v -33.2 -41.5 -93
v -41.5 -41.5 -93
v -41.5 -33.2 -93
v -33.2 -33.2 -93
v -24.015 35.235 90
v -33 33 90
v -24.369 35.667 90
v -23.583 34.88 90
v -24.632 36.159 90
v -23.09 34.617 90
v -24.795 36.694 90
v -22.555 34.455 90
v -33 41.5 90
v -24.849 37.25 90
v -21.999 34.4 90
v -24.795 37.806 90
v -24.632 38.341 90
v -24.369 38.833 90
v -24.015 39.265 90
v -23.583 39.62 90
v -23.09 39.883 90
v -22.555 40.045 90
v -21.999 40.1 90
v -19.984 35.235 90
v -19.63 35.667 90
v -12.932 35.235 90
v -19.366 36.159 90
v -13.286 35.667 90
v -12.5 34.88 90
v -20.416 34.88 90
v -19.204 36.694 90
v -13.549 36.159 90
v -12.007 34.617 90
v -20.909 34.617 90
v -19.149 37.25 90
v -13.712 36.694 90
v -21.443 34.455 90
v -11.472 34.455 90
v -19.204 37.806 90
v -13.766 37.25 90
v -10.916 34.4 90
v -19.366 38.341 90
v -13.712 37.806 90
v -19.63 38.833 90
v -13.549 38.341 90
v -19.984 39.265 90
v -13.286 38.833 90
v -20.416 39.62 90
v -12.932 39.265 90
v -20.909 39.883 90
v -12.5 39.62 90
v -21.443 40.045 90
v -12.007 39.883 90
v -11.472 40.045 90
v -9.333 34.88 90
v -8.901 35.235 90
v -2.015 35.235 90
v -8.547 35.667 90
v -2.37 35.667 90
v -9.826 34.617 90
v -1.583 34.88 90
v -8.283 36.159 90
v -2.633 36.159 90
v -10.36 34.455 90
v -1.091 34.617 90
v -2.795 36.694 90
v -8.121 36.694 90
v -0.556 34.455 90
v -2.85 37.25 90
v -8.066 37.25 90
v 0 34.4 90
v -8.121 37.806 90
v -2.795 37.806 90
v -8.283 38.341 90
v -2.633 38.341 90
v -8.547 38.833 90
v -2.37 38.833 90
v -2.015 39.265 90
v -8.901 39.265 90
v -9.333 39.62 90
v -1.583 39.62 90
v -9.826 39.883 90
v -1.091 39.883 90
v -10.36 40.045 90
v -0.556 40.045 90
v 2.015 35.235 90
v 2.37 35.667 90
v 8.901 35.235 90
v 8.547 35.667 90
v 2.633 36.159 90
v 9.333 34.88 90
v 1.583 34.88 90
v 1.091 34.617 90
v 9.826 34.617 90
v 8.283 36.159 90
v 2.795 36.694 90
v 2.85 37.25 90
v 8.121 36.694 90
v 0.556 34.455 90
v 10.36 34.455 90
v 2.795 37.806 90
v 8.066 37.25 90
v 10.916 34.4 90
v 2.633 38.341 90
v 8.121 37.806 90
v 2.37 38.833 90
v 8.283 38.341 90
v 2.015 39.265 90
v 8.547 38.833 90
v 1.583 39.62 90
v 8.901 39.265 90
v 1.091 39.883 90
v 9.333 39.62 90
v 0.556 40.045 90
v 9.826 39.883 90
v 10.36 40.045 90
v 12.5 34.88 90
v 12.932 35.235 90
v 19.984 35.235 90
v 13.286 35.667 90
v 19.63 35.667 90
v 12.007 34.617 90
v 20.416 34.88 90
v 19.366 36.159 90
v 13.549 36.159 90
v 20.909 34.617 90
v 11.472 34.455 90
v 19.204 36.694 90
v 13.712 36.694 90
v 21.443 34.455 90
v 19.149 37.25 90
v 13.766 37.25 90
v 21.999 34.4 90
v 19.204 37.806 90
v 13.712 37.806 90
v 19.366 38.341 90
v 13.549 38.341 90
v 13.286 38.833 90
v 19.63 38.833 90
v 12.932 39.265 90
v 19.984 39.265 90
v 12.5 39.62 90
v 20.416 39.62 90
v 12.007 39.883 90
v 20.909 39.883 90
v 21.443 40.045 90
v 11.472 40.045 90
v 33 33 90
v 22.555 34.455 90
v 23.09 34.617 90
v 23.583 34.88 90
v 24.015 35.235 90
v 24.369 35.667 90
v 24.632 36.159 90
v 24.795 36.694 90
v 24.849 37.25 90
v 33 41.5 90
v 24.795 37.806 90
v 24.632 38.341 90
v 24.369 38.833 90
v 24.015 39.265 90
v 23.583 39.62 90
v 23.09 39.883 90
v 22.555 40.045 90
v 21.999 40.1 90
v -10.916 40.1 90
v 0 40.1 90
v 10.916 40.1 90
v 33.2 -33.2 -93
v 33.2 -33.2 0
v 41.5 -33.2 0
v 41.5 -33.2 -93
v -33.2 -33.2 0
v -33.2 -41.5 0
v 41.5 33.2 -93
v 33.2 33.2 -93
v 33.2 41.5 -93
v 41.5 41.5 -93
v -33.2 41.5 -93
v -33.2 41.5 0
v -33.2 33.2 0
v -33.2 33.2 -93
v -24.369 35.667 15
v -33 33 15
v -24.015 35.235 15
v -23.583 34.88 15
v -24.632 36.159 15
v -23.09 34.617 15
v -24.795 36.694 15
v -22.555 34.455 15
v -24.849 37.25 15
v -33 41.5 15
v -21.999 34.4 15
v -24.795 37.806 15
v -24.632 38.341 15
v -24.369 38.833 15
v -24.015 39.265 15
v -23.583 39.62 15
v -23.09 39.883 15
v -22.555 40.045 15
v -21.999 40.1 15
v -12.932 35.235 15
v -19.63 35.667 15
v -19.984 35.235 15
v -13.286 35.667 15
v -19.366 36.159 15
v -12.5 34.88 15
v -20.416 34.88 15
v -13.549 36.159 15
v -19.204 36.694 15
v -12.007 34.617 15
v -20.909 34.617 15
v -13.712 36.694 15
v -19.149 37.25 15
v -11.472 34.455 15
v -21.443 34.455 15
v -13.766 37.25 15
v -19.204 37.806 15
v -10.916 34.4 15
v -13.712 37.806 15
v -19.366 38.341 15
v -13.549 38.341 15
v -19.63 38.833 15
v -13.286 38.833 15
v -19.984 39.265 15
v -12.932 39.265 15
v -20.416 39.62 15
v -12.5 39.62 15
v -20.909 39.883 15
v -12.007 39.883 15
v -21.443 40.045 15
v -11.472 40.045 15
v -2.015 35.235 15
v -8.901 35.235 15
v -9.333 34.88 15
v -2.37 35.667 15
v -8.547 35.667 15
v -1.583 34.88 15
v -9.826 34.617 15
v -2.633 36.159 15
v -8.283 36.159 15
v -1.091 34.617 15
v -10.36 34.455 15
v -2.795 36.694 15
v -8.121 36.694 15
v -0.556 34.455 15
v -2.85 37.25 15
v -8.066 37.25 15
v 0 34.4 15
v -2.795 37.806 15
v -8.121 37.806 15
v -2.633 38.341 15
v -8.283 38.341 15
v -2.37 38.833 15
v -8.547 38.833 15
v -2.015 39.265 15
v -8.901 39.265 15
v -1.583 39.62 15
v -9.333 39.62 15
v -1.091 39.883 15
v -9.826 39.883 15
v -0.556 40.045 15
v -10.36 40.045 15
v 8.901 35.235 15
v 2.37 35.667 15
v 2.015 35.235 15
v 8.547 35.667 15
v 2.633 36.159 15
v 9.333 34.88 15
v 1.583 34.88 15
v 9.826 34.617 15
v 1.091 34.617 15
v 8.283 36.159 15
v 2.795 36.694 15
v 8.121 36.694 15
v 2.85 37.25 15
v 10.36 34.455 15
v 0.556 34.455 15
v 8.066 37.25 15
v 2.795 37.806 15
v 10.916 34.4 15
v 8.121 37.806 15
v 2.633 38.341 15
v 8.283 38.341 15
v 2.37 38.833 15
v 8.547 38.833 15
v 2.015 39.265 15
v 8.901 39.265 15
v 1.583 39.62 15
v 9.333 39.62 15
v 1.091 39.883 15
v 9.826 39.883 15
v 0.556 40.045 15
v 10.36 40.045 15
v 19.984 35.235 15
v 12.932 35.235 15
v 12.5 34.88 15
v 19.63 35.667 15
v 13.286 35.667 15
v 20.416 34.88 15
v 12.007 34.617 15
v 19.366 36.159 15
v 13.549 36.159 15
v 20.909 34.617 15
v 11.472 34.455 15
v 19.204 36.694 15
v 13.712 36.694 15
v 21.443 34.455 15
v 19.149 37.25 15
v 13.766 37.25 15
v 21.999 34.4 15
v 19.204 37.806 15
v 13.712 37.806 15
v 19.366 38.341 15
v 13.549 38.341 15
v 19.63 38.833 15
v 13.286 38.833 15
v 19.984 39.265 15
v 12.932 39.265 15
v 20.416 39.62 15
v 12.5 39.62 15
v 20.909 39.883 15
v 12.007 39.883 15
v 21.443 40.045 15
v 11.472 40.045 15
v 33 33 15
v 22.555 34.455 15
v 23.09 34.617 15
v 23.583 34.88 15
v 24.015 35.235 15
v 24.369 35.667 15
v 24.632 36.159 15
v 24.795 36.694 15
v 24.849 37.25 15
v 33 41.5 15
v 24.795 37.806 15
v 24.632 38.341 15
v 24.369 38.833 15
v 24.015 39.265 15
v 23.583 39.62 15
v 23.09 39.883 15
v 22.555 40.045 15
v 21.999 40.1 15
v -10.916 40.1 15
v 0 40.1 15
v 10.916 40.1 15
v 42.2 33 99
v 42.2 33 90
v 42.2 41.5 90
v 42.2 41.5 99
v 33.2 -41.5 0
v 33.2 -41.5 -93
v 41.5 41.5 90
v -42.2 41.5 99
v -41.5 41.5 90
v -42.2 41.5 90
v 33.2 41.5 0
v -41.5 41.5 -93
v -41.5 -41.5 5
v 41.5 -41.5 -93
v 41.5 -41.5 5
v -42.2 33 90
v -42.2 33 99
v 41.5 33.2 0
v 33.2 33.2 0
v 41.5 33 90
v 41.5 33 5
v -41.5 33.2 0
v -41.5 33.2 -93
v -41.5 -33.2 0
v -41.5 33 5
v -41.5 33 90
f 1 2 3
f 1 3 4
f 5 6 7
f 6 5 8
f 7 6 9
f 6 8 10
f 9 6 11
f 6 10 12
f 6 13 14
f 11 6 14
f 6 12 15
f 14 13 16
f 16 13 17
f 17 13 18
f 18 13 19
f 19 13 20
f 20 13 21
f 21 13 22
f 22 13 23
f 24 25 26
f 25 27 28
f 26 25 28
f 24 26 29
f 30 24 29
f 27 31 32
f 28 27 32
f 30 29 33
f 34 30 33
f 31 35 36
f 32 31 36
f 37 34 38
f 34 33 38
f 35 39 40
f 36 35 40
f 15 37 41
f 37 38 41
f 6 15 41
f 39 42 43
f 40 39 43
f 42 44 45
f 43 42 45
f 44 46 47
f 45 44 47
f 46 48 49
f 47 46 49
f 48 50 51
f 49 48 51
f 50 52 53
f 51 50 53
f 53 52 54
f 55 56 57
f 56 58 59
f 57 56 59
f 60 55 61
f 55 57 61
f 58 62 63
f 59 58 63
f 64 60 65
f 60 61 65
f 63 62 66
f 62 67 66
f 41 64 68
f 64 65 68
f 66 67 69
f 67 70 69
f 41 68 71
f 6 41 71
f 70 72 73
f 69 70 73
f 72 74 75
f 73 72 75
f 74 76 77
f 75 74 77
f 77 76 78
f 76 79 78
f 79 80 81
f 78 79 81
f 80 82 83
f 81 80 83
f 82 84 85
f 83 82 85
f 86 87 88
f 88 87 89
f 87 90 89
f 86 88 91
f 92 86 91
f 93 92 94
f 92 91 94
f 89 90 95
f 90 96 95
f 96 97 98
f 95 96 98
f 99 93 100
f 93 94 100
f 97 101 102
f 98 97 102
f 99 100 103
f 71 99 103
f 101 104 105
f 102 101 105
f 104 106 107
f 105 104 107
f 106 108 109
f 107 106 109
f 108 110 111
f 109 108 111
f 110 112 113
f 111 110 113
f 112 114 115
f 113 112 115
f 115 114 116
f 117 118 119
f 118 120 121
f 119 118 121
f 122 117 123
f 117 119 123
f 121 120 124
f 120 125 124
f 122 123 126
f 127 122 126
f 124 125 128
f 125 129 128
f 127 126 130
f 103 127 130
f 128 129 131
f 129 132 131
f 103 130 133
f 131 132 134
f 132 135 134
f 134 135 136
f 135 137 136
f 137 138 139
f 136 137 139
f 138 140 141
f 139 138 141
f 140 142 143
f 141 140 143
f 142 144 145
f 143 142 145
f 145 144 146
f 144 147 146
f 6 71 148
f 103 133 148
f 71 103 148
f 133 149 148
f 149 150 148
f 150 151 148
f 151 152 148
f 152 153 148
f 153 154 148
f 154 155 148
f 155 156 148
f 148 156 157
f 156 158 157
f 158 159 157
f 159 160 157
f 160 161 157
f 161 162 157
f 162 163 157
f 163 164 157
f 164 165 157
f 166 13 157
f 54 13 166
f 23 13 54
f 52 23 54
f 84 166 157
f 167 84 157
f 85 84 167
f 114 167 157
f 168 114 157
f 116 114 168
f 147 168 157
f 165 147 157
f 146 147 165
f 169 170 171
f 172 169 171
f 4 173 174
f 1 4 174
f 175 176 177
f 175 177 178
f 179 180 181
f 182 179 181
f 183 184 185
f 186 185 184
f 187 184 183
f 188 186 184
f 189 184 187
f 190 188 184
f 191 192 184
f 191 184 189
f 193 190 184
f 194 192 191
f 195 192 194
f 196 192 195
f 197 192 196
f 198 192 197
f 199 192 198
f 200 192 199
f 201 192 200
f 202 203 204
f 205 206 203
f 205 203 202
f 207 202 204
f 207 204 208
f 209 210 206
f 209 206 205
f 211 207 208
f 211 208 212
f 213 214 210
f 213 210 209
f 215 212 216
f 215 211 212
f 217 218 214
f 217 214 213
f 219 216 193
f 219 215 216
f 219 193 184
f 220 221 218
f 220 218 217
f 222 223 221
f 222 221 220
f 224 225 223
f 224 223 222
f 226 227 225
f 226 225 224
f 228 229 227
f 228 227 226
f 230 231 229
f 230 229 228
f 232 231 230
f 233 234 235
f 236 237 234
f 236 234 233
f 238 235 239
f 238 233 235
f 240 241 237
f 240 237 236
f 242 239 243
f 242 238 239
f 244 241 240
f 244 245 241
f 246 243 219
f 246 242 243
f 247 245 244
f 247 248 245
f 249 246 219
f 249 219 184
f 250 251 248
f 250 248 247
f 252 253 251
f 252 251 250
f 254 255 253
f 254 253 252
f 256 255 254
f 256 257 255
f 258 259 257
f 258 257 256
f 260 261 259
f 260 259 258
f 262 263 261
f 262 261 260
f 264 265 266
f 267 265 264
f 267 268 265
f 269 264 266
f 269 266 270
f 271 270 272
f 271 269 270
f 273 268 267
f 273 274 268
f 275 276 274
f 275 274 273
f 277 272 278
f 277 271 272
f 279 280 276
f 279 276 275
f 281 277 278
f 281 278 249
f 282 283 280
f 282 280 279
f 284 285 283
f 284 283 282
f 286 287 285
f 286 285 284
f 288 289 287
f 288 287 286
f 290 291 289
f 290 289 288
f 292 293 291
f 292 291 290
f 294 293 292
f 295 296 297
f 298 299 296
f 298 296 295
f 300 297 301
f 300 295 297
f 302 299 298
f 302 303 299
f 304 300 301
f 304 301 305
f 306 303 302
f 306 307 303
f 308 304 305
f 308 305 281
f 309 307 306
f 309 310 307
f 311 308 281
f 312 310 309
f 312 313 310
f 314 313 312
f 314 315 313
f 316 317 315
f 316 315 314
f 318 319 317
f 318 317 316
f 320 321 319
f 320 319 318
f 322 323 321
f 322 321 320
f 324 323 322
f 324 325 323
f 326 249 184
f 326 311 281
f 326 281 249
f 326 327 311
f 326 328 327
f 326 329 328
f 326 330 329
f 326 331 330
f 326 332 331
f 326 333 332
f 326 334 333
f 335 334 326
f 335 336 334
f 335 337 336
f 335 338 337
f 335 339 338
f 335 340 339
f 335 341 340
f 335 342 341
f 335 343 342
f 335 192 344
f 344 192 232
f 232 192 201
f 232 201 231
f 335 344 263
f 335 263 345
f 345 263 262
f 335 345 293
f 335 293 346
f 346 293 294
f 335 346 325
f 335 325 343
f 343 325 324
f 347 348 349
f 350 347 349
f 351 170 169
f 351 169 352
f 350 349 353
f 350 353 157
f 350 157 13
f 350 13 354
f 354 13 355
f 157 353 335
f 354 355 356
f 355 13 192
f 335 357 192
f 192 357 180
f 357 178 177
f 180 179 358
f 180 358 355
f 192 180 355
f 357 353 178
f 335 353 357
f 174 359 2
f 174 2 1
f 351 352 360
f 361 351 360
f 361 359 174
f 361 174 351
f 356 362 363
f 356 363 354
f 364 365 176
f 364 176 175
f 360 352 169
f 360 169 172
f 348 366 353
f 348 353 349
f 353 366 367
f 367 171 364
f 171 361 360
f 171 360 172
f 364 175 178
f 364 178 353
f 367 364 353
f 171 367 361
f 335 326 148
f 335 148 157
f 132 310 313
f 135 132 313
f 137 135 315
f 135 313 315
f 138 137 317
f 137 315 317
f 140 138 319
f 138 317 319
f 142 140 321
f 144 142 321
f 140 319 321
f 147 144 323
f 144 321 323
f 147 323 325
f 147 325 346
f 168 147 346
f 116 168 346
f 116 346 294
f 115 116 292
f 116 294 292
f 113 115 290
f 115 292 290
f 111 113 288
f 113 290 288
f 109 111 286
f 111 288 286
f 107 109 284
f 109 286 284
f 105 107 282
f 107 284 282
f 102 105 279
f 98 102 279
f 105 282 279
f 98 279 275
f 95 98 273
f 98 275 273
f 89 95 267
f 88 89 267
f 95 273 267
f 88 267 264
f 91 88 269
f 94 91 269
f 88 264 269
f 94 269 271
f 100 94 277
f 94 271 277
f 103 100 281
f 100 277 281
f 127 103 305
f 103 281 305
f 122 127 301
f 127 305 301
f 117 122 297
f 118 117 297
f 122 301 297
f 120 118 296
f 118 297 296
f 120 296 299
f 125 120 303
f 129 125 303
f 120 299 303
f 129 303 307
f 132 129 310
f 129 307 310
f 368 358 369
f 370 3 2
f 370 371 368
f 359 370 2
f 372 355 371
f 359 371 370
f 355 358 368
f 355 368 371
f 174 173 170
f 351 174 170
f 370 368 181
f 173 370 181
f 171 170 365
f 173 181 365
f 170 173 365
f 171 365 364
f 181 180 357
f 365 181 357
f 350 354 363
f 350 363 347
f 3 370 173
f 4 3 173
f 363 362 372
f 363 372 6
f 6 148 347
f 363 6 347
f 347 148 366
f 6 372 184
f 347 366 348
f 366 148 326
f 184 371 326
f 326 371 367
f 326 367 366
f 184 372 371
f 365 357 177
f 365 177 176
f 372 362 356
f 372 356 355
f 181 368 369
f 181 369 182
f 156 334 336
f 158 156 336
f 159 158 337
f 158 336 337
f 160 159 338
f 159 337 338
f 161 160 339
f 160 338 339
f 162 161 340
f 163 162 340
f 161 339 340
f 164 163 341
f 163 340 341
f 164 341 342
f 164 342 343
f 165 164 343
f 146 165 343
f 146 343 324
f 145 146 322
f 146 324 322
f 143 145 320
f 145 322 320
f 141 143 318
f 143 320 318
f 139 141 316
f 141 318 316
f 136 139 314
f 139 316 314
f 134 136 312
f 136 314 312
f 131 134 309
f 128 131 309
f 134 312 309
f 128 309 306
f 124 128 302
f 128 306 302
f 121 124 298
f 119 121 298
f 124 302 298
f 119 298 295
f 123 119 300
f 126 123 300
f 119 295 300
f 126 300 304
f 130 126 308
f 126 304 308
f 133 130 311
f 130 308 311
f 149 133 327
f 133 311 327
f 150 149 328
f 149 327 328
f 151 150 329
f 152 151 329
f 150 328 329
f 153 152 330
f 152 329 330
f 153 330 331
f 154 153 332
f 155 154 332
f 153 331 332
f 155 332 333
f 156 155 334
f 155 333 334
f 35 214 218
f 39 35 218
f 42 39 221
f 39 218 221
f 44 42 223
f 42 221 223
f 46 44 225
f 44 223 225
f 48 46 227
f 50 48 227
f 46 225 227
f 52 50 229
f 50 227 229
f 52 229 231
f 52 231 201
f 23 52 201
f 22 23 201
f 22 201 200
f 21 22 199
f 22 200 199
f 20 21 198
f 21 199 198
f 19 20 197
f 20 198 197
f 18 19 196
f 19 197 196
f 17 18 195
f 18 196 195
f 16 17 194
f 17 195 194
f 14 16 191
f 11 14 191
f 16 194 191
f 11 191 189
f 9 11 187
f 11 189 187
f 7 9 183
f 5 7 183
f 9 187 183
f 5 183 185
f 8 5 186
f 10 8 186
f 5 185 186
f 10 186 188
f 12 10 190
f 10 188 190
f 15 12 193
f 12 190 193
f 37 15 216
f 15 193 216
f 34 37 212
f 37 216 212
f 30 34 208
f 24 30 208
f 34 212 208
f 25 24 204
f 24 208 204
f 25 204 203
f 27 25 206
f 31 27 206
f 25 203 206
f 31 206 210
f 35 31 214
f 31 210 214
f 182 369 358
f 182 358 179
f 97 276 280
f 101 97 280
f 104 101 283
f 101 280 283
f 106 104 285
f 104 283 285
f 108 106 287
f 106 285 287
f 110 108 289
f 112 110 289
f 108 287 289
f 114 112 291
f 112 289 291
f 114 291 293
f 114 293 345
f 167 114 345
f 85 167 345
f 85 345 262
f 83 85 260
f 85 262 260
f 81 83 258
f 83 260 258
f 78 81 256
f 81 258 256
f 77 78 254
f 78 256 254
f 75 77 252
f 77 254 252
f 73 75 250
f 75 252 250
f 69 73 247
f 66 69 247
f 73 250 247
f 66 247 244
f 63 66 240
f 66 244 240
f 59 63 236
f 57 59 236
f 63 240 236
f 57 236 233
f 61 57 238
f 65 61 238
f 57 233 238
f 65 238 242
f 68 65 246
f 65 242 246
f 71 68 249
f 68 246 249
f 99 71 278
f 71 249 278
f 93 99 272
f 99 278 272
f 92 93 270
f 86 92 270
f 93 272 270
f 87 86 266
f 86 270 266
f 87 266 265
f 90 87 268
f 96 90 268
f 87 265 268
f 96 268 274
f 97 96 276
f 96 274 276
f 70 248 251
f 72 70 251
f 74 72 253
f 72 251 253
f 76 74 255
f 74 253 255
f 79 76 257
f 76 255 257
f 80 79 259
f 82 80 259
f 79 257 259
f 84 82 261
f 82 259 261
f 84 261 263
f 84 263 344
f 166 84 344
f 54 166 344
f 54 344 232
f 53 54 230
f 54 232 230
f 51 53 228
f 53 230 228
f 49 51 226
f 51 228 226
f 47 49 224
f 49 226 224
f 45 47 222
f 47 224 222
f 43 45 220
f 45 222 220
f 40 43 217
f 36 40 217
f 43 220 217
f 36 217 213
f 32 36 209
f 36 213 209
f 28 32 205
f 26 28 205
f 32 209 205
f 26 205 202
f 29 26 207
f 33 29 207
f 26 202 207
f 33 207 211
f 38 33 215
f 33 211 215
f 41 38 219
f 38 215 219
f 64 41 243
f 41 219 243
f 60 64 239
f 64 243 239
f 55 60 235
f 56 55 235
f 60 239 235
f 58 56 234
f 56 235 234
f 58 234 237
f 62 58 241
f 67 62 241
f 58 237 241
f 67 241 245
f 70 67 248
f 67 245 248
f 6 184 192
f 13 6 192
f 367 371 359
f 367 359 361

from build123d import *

# Parameters (mm, degrees)
F0_W      = 83
F0_H      = 83
F1_DEPTH  = 5
F2_W      = 83
F2_H      = 8.5
F3_DEPTH  = 10
F4_W      = 8.5
F4_H      = 8.5
F5_DEPTH  = 75
F6_R      = 2.85
F7_DEPTH  = 75
F8_W      = 83
F8_H      = 8.5
F8_R      = 2.85
F8_W_2    = 0.7
F9_DEPTH  = 9
F10_W     = 8.3
F10_H     = 8.3
F11_DEPTH = 93


with BuildPart() as f1:
    # F0 (on Top) → F1 (new body)
    with BuildSketch(Plane.XY):
        Rectangle(F0_W, F0_H)
    extrude(amount=F1_DEPTH)

    # F2 (on face) → F3 (join)
    with BuildSketch(Plane.XY.offset(5)):
        with Locations((0, 37.25)):
            Rectangle(F2_W, F2_H)
    extrude(amount=F3_DEPTH)

    # F4 (on face) → F5 (join)
    with BuildSketch(Plane.XY.offset(15)):
        with Locations((-37.25, 37.25)):
            Rectangle(F4_W, F4_H)
        with Locations((37.25, 37.25)):
            Rectangle(F4_W, F4_H)
    extrude(amount=F5_DEPTH)

    # F6 (on face) → F7 (join)
    with BuildSketch(Plane.XY.offset(15)):
        with Locations((-21.999383, 37.25)):
            Circle(F6_R)
        with Locations((-10.916319, 37.250001)):
            Circle(F6_R)
        with Locations((0, 37.25)):
            Circle(F6_R)
        with Locations((10.916319, 37.250001)):
            Circle(F6_R)
        with Locations((21.999383, 37.25)):
            Circle(F6_R)
    extrude(amount=F7_DEPTH)

    # F8 (on face) → F9 (join)
    with BuildSketch(Plane.XY.offset(90)):
        with Locations((0, 37.25)):
            Rectangle(F8_W, F8_H)
        with Locations((0, 37.25)):
            Circle(F8_R, mode=Mode.SUBTRACT)
        with Locations((0, 37.25)):
            Circle(F8_R)
        with Locations((-41.85, 37.25)):
            Rectangle(F8_W_2, F8_H)
        with Locations((41.85, 37.25)):
            Rectangle(F8_W_2, F8_H)
    extrude(amount=F9_DEPTH)

    # F10 (on face) → F11 (join)
    with BuildSketch(Plane(origin=(0, 0, 0), x_dir=(1, 0, 0), z_dir=(0, 0, -1))):
        with Locations((-37.35, 37.35)):
            Rectangle(F10_W, F10_H)
        with Locations((37.35, 37.35)):
            Rectangle(F10_W, F10_H)
        with Locations((-37.35, -37.35)):
            Rectangle(F10_W, F10_H)
        with Locations((37.35, -37.35)):
            Rectangle(F10_W, F10_H)
    extrude(amount=F11_DEPTH)


solid = f1.part
